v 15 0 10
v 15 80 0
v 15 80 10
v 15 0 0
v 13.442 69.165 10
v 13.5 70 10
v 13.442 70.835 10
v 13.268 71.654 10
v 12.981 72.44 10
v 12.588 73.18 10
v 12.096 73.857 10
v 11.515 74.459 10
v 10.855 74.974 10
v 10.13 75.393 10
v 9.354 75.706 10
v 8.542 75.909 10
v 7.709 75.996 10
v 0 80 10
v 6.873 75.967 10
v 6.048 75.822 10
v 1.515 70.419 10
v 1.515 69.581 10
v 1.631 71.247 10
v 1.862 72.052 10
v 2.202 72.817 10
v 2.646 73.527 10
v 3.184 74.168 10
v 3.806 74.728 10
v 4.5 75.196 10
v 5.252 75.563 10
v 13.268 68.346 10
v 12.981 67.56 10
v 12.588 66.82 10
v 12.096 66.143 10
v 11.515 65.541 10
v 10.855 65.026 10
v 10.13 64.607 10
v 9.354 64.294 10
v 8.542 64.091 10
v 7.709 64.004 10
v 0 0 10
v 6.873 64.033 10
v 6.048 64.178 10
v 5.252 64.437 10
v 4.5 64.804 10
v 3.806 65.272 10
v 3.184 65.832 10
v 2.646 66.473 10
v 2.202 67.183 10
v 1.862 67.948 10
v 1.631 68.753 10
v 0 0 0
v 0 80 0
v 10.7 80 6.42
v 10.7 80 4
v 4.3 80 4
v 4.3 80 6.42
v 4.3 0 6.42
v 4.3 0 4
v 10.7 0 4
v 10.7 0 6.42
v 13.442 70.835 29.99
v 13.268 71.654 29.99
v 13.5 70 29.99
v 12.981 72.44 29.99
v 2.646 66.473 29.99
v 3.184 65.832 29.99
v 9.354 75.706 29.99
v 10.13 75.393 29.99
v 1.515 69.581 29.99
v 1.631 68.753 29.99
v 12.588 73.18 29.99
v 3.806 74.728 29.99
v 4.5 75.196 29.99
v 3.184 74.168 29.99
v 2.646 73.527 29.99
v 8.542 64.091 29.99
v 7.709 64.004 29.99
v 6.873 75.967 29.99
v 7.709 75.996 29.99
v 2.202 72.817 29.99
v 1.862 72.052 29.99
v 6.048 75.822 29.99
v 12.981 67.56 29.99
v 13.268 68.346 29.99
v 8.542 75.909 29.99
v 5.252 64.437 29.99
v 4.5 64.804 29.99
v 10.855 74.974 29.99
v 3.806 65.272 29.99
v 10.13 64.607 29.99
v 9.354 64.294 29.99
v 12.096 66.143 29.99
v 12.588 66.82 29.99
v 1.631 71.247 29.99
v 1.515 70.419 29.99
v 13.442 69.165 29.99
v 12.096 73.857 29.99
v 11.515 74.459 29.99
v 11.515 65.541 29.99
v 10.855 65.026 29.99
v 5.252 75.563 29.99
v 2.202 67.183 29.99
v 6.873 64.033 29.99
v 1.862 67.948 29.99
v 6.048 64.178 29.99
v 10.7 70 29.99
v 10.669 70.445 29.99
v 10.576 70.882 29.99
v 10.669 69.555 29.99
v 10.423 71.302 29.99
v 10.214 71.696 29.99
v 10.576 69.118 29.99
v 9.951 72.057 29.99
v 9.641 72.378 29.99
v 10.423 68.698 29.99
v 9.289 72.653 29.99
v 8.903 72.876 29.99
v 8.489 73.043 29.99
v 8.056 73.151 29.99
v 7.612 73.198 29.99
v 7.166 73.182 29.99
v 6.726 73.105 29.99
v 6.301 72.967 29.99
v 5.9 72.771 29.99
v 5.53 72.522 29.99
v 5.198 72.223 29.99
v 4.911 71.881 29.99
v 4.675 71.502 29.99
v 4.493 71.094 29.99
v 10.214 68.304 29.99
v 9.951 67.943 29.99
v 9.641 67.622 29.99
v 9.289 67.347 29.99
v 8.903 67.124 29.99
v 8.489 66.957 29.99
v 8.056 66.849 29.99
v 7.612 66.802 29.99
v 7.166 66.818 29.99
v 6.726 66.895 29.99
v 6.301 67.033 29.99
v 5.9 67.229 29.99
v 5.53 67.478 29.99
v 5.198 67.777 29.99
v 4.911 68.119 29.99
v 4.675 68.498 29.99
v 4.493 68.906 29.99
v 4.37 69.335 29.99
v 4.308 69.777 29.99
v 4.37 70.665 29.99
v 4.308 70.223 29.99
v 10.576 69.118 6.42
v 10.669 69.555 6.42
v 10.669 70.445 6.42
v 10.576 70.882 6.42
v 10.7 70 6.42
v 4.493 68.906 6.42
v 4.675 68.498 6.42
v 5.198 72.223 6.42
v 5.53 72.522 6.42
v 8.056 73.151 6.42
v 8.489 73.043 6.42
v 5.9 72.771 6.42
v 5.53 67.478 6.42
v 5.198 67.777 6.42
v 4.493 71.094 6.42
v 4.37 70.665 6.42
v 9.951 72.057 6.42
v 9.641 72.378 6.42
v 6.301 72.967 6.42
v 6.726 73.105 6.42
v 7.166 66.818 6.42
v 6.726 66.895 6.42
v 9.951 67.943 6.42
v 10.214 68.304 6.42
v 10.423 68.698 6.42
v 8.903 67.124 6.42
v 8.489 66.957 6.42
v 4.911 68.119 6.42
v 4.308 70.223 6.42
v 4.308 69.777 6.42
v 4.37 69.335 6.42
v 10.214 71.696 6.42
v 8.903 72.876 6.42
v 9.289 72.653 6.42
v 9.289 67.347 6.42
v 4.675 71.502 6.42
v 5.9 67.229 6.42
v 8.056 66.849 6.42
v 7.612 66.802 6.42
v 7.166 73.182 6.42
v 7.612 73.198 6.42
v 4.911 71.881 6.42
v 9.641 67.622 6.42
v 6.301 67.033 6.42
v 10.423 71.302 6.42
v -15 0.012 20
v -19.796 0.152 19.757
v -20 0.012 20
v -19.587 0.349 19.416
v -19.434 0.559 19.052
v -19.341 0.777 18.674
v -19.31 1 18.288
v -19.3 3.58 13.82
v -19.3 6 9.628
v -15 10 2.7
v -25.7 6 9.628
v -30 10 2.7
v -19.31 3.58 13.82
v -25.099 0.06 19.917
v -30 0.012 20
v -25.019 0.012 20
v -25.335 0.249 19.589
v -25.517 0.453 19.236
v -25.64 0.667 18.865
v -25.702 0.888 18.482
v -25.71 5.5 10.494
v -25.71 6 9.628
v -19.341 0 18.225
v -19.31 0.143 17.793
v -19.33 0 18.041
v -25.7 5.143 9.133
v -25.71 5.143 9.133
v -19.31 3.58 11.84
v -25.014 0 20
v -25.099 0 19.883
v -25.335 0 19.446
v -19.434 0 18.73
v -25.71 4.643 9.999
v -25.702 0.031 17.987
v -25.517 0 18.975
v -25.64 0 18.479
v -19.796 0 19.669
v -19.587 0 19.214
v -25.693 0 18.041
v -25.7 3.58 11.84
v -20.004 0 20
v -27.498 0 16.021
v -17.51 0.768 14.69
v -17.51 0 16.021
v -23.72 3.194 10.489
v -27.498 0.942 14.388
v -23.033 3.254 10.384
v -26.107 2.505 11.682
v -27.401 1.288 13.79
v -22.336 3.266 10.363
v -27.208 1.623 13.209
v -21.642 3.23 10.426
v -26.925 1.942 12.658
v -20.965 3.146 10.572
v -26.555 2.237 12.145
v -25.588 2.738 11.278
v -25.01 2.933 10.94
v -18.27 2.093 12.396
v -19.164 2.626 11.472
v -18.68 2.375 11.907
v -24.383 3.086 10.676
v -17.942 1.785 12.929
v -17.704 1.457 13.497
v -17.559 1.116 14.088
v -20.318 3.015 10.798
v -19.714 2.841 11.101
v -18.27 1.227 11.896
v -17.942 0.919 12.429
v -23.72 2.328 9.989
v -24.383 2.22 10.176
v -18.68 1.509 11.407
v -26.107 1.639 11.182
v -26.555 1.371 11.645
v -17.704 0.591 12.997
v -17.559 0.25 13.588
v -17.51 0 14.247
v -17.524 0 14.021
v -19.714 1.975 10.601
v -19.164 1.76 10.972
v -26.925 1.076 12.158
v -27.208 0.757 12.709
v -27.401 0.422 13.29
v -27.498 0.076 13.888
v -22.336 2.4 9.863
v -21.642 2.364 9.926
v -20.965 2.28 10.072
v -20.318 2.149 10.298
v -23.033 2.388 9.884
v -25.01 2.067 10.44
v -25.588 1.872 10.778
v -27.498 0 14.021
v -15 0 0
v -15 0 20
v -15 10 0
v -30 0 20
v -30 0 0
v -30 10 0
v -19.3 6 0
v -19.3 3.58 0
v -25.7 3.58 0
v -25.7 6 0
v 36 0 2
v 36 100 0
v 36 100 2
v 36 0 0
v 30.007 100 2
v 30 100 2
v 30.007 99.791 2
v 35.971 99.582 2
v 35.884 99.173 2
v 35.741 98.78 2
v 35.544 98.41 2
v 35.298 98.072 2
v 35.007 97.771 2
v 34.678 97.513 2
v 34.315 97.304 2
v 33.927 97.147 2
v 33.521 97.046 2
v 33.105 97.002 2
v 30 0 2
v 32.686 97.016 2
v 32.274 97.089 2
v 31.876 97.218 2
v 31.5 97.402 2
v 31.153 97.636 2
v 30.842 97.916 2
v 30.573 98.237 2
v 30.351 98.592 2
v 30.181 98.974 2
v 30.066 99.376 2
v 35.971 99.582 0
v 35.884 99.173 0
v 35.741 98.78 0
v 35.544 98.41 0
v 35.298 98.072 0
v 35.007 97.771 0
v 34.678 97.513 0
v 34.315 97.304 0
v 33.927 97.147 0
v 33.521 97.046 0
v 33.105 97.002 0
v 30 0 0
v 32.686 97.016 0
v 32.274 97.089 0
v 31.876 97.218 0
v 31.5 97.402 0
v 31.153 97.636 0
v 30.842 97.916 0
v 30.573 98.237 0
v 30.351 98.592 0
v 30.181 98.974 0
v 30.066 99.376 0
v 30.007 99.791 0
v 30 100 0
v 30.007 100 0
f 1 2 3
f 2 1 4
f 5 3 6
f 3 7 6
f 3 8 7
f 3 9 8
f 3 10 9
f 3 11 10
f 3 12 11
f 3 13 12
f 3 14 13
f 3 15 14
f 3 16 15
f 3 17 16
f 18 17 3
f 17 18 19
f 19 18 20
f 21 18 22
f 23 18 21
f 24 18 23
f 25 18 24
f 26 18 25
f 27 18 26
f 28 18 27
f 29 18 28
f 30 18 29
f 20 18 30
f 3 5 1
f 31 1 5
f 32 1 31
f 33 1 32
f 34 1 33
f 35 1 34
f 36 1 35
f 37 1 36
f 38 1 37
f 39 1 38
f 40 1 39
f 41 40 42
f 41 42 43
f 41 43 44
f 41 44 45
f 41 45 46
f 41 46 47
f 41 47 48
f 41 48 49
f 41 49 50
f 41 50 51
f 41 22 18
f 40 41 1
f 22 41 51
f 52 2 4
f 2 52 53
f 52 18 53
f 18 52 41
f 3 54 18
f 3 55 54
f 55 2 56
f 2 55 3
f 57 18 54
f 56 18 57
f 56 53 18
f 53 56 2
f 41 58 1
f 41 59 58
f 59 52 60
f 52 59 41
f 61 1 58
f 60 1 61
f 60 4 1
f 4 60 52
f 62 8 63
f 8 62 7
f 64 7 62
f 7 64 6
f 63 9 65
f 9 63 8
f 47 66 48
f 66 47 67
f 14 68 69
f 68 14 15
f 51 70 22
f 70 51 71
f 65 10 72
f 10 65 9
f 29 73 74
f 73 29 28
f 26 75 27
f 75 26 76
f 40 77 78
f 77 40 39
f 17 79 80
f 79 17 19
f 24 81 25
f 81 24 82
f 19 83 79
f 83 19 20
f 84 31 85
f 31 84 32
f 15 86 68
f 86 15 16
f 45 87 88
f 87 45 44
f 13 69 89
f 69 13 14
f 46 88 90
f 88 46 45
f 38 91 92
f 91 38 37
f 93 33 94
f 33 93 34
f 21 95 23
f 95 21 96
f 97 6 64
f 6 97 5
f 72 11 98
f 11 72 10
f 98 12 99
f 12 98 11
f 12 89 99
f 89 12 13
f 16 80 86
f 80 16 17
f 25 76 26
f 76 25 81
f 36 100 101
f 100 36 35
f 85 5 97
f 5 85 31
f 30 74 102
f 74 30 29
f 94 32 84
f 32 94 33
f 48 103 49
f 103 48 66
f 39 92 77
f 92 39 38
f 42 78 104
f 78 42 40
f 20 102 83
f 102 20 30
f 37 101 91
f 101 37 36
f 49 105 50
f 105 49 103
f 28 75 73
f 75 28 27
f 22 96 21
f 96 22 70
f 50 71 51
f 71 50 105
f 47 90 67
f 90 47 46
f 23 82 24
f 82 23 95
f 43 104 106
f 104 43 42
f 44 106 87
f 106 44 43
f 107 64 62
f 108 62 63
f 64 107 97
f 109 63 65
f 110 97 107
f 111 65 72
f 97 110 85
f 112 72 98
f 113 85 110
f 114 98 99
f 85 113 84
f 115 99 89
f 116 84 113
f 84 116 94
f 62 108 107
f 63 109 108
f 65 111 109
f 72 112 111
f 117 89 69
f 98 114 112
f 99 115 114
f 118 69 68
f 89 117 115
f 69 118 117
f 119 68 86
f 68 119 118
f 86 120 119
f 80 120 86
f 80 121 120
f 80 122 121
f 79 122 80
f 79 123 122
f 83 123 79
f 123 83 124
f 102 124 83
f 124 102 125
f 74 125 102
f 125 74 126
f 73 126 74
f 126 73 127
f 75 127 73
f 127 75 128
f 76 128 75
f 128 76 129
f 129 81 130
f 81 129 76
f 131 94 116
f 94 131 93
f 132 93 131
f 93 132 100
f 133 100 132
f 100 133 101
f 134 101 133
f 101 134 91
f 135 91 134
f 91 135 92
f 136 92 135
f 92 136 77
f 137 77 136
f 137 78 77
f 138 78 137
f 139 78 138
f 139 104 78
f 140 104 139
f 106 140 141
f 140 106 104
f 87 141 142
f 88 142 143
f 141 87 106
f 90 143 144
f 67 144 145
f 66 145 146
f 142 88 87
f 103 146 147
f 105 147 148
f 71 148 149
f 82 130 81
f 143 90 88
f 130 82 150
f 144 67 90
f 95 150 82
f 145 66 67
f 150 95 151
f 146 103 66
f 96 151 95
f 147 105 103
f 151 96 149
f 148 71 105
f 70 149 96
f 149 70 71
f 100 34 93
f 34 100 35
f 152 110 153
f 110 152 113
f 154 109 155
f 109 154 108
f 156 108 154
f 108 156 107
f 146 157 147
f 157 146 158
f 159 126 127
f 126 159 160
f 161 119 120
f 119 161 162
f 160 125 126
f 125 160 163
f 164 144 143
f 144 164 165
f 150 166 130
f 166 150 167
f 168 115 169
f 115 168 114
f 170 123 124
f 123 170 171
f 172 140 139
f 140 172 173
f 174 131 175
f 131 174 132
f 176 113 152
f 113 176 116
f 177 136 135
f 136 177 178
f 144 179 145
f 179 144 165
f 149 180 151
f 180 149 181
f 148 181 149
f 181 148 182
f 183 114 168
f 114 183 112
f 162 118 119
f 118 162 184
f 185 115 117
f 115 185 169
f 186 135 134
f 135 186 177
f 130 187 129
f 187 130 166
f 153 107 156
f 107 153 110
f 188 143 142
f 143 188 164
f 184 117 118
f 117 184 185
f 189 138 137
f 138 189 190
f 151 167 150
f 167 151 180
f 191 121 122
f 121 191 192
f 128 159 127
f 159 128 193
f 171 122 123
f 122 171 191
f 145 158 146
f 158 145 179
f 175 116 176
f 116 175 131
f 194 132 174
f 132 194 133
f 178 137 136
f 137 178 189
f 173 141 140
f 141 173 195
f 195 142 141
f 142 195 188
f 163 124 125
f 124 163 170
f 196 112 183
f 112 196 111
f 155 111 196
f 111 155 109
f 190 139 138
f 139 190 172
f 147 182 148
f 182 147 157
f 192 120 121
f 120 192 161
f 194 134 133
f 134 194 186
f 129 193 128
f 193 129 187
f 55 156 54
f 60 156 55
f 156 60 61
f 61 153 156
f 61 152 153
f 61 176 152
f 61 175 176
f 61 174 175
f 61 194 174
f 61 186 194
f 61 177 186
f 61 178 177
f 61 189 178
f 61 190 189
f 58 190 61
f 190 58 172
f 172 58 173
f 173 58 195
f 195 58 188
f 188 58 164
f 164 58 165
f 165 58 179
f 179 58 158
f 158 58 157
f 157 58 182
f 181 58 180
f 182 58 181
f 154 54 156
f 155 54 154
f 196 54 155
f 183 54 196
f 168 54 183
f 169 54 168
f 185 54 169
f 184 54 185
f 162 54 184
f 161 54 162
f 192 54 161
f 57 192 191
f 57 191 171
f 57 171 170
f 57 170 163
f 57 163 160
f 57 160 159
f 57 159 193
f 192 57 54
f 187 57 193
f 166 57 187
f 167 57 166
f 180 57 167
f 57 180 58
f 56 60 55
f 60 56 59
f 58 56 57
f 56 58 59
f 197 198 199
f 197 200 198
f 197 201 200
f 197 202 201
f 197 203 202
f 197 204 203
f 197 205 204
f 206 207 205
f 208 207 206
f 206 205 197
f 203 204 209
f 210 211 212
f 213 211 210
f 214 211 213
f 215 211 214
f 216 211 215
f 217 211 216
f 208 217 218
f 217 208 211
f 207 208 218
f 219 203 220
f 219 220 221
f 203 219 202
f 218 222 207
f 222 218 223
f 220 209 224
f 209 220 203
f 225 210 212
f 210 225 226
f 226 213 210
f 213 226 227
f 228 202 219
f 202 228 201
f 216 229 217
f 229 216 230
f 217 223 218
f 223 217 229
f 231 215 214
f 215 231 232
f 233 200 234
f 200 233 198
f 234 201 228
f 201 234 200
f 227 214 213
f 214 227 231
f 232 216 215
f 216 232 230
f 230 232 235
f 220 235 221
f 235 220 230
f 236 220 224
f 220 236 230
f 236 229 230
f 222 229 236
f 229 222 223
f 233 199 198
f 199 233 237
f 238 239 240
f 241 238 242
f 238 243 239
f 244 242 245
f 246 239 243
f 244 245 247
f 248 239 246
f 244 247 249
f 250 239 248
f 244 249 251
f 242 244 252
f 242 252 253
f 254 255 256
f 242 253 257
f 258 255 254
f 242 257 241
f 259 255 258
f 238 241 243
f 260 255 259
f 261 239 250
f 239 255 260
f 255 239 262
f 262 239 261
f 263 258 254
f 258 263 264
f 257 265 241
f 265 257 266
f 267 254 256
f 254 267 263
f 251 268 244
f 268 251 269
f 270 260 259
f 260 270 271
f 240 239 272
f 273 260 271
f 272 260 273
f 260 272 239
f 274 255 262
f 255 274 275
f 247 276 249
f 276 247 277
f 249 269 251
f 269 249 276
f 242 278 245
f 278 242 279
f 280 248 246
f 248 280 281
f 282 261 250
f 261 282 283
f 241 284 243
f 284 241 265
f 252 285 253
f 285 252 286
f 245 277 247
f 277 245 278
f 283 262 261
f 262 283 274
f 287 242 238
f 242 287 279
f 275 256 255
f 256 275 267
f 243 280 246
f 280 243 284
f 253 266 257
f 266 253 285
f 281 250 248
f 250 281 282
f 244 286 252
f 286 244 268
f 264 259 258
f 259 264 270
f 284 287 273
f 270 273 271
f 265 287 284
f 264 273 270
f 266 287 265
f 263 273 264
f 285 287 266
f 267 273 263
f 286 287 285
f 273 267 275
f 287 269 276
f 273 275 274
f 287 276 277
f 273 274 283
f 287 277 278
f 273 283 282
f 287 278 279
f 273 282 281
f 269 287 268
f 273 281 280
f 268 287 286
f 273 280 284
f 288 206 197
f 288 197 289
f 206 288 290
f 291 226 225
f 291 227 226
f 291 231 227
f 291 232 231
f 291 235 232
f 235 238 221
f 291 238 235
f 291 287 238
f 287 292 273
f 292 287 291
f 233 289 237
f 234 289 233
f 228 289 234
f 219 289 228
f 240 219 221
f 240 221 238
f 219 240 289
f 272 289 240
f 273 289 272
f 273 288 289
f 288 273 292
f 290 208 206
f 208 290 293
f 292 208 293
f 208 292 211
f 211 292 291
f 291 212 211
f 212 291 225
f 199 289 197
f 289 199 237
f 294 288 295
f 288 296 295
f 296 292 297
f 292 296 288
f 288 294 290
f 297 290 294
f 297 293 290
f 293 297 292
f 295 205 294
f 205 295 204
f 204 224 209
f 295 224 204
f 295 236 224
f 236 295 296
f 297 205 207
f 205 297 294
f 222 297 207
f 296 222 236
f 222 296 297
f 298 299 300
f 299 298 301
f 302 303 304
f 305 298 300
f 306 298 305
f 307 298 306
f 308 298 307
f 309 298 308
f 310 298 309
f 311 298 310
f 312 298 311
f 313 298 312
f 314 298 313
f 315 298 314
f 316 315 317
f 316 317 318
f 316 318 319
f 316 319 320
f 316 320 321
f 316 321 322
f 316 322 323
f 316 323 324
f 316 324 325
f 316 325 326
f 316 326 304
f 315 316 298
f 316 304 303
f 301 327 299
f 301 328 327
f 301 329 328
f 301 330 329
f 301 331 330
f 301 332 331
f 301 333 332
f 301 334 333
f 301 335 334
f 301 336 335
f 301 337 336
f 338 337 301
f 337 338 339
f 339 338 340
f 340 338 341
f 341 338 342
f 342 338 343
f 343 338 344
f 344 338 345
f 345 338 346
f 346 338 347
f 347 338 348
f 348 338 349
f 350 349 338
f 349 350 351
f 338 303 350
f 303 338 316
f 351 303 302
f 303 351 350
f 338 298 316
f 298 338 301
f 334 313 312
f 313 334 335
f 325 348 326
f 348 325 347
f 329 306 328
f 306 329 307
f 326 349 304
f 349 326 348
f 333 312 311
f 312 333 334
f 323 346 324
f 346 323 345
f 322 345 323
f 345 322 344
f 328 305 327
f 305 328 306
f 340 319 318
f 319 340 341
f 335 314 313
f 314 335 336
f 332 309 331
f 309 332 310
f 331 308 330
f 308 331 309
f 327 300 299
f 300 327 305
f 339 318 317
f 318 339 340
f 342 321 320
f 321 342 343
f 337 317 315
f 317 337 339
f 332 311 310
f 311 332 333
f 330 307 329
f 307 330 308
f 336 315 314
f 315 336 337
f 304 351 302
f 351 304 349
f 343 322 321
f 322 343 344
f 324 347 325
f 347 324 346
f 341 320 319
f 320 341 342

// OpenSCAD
// include <pw_primitives.scad>;

$fn=45;

eps = 0.01; eps2 = eps*2;
tol = 0.2;
magnet_wid = 6; magnet_height = 2;
body_wid = 15; body_len = 100; body_height = 10;
feeder_tube_height = 20; feeder_tube_wid = 12;
pusher_wid = magnet_wid;
pusher_chan_wid = magnet_wid + tol*2; pusher_chan_x = (body_wid-magnet_wid)/2-tol;
pusher_chan_height = magnet_height + tol*2; pusher_chan_z = 4;
end_slot_height = 1; end_slot_len = 10;
bot_angle = 30; bot_len = body_height/sin(bot_angle);
diag_front_x_off = (body_len-bot_len)+(body_height*sin(bot_angle))/2+tol;
washer_dia = 10; washer_height = 1; washer_z_off = 1;

// pegs at the corners of a box from -x,-y to x,y
module pegs(x, y, r, h) {
    translate([ x,  y, 0]) cylinder(r=r, h=h);
    translate([-x,  y, 0]) cylinder(r=r, h=h);
    translate([ x, -y, 0]) cylinder(r=r, h=h);
    translate([-x, -y, 0]) cylinder(r=r, h=h);
}

difference() {
    // the body
    union() {
        cube([body_wid, body_len-bot_len, body_height]);
        translate([body_wid/2, 70, body_height-eps])
          cylinder(h=feeder_tube_height, d=feeder_tube_wid);
    };
    // the feeder tube;
    translate([body_wid/2, 70, pusher_chan_z+eps]) 
      cylinder(h=feeder_tube_height+body_height, d=magnet_wid+tol*2);
    // the tube for the pusher
    translate([pusher_chan_x, -eps, pusher_chan_z]) 
      cube([pusher_chan_wid, body_len+eps2, pusher_chan_height+eps2]);
    // the channel for the pusher finger handle
    
    // the bottom angle
    // multmatrix([ 
    //   [1, 0, 0, -eps], 
    //   [0, 1, 0, (body_len-bot_len)+eps], 
    //   [0, sin(bot_angle), 1, -body_height] 
    // ]) union() {
}

translate([-30, body_height, 0]) rotate([90, 0, 0]) difference() {
    cube([body_wid, bot_len, body_height]);
    // the feeder tube
    translate([pusher_chan_x, -eps, pusher_chan_z]) 
      cube([pusher_chan_wid, body_len+eps2, pusher_chan_height+eps2]);
    // the stuff on an angle
    translate([-eps, (body_height*sin(bot_angle))/2+tol, 0]) rotate([bot_angle, 0, 0]) union() {
        // the main face
        translate([0, 0, -body_height]) cube([body_wid+eps2, bot_len, body_height]);
        // the slot to the magnet placer hole
        translate([pusher_chan_x, bot_len*(pusher_chan_z/body_height), -eps])
          hull() {
            translate([pusher_chan_wid/2, end_slot_len, 0]) 
              cylinder(h=end_slot_height, d=pusher_chan_wid);
            cube([pusher_chan_wid, 1, end_slot_height]);
        }
        // the slot for the washer
        translate([body_wid/2, 5+end_slot_len, washer_z_off+end_slot_height]) hull() {
            cylinder(h=washer_height, d=washer_dia);
            translate([0, washer_dia/2, 0]) cylinder(h=washer_height, d=washer_dia);
        }
    }
};

translate([30, 0, 0]) union() {
    difference() {
        cube([6, 100, 2]);
        translate([6/2, 100, -eps]) cylinder(h=2+eps2, d=6);
    };
}
